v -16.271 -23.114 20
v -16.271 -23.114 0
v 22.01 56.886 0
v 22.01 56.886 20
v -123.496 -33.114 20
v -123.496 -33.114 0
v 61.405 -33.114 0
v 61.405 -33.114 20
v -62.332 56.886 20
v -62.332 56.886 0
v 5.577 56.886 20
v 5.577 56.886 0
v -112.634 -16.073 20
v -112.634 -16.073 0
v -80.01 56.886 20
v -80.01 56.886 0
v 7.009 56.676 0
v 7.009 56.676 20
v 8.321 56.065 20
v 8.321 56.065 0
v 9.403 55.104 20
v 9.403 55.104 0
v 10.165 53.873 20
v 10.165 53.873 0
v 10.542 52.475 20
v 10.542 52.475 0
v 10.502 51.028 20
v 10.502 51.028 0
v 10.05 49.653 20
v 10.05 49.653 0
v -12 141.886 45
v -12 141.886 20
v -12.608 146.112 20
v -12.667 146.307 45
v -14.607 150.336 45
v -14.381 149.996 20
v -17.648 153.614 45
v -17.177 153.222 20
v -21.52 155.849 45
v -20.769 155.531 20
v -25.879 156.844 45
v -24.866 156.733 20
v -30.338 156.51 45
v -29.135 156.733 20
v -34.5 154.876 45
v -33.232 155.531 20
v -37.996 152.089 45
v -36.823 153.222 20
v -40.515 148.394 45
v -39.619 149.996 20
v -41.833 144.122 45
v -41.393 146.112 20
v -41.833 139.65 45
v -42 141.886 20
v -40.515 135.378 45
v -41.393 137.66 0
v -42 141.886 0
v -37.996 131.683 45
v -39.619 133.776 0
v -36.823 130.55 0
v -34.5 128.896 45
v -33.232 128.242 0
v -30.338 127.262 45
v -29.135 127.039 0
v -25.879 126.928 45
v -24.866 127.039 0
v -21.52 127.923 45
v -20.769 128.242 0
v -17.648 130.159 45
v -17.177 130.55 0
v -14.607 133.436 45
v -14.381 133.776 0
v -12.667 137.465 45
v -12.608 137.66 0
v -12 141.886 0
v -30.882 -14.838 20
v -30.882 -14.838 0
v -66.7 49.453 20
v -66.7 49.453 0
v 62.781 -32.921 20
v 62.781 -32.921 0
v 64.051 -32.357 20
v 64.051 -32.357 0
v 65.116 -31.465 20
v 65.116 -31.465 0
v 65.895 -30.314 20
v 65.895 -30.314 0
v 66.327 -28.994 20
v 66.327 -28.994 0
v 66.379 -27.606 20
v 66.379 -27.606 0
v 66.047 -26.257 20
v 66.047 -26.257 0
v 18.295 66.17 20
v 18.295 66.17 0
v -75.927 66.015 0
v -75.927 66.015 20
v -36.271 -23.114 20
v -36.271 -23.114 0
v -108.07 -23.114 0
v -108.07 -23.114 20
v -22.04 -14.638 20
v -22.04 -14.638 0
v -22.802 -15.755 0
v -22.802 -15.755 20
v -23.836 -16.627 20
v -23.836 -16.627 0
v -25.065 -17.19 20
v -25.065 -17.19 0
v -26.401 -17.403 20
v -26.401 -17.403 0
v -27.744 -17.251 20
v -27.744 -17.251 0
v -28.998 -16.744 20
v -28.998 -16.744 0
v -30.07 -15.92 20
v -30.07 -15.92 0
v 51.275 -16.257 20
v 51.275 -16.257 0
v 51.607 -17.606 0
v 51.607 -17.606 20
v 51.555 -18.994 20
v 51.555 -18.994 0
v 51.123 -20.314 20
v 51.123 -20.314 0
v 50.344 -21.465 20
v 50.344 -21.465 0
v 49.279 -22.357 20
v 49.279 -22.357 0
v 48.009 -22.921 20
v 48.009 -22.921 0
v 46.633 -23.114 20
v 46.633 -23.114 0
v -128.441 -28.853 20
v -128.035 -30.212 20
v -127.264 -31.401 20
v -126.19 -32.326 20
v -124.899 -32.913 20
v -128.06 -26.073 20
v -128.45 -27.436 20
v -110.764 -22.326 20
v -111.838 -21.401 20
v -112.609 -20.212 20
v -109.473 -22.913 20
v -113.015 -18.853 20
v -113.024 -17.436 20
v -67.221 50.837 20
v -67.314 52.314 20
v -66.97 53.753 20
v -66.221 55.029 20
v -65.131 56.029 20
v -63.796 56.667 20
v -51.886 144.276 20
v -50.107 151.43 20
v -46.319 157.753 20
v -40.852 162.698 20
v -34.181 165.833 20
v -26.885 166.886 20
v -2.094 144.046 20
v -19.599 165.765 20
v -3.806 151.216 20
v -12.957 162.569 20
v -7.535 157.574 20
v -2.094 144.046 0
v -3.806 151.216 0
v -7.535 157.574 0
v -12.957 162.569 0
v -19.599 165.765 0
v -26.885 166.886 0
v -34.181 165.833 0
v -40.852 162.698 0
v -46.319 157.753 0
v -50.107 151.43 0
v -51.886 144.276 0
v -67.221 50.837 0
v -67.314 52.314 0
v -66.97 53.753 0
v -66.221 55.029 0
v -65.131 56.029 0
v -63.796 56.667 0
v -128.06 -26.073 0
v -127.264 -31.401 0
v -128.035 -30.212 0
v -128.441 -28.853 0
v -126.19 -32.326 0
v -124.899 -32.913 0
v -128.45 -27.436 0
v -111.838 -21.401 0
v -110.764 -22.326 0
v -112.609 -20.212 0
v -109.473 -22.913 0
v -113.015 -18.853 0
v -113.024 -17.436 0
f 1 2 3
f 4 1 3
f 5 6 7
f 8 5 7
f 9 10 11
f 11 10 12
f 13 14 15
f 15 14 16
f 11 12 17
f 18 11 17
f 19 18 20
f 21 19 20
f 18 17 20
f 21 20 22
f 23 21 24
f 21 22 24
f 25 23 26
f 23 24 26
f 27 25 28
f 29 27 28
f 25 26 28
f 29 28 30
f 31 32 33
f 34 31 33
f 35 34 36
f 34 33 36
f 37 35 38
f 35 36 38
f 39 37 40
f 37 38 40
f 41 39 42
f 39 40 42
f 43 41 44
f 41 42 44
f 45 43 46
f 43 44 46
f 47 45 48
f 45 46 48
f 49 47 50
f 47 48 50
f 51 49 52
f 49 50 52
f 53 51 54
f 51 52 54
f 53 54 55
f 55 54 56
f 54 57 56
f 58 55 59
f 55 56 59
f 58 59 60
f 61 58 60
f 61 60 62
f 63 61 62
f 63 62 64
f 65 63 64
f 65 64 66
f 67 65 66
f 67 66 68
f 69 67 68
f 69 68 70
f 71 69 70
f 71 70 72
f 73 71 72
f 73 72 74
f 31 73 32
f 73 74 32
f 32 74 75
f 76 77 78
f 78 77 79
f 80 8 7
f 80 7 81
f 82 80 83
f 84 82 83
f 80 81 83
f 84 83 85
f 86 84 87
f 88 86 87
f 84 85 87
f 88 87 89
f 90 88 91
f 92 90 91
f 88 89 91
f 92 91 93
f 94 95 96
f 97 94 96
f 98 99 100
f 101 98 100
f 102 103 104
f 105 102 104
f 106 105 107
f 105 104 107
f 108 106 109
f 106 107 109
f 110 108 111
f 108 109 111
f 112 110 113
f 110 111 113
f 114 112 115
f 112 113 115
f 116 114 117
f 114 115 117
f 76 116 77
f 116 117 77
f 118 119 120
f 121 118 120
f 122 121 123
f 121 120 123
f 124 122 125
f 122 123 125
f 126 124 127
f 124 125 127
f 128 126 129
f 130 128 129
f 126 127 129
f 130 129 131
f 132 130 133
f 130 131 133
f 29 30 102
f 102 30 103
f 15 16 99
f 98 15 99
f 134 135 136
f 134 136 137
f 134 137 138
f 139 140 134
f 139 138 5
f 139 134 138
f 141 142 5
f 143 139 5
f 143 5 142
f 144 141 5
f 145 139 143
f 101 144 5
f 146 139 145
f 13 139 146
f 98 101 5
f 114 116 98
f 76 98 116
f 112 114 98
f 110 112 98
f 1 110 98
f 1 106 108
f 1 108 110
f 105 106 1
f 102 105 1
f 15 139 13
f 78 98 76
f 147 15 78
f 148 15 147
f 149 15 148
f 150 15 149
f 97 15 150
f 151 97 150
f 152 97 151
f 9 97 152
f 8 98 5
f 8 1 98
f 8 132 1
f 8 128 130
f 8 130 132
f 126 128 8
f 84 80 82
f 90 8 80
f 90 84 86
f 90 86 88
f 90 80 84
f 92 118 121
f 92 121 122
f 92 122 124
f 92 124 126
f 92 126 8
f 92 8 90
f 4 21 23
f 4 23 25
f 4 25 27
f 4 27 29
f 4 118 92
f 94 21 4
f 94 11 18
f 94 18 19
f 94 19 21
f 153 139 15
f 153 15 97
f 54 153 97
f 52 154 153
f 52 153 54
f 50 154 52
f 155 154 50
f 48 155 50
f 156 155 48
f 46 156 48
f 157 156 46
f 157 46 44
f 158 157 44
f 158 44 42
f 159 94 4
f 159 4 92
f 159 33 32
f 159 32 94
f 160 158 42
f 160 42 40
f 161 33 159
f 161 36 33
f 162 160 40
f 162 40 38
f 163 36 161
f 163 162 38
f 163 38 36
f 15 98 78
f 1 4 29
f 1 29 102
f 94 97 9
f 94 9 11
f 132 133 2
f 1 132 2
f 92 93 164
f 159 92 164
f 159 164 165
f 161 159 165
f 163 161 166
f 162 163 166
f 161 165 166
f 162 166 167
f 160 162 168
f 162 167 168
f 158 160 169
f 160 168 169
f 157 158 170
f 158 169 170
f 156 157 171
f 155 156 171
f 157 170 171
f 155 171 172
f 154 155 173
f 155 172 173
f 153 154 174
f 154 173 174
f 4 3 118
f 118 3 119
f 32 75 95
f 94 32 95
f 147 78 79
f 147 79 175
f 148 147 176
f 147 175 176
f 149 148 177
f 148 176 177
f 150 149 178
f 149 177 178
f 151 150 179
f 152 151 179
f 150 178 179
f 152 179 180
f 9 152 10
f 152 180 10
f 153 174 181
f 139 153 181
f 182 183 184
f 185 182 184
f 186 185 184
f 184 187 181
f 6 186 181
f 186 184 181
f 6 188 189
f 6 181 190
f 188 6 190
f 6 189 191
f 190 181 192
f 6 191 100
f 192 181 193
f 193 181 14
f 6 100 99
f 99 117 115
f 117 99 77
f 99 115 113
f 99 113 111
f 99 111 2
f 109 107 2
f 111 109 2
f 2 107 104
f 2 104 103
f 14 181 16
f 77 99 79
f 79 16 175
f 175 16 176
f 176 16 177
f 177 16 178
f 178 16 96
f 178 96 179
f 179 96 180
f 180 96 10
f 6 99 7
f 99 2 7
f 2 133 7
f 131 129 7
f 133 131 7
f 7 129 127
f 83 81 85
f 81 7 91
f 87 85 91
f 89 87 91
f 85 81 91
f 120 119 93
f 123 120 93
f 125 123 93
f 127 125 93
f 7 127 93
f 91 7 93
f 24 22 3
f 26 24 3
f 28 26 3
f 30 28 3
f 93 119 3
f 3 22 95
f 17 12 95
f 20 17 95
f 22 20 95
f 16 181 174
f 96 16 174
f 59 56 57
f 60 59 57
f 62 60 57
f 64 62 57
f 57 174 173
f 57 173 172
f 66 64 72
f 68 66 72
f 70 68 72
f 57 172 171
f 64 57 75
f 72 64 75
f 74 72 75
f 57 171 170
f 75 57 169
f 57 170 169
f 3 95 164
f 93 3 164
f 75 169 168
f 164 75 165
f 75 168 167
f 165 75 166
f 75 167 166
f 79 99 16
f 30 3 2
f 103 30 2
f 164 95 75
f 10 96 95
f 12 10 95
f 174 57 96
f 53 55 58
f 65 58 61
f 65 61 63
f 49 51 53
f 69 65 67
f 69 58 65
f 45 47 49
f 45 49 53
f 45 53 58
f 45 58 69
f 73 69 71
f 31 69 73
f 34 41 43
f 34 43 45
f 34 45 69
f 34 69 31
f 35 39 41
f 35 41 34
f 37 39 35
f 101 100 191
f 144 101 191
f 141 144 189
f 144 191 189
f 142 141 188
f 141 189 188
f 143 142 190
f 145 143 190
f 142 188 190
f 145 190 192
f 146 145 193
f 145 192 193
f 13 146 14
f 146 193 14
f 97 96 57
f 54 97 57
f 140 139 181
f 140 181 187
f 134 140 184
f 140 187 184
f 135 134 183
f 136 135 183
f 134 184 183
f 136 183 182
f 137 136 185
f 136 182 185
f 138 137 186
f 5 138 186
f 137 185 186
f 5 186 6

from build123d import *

# Parameters (mm, degrees)
F1_DEPTH = 20
F2_R     = 15
F3_DEPTH = 25


with BuildPart() as f1:
    # F0 (on Top) → F1 (new body)
    with BuildSketch(Plane.XY):
        with BuildLine():
            Line((66.0472436046, -26.2565443359), (-2.0937833608, 144.0460289628))
            ThreePointArc((-2.0937833608, 144.0460289628), (-26.8847617752, 166.8857654042), (-51.8857822677, 144.2761403347))
            Line((-51.8857822677, 144.2761403347), (-128.0604405721, -26.0728991835))
            ThreePointArc((-128.0604405721, -26.0728991835), (-127.6915622894, -30.833770725), (-123.4960085584, -33.1139676273))
            Line((-123.4960085584, -33.1139676273), (61.4050481416, -33.1139676273))
            ThreePointArc((61.4050481416, -33.1139676273), (65.5455261609, -30.9169021202), (66.0472436046, -26.2565443359))
        make_face()
        with BuildLine():
            Line((-36.2713433227, -23.1139676273), (-108.0700619725, -23.1139676273))
            ThreePointArc((-108.0700619725, -23.1139676273), (-112.2656157035, -20.833770725), (-112.6344939862, -16.0728991835))
            Line((-112.6344939862, -16.0728991835), (-80.009586342, 56.8860323727))
            Line((-80.009586342, 56.8860323727), (-75.9274494544, 66.0148964001))
            Line((-75.9274494544, 66.0148964001), (-42.0002968609, 141.8860323727))
            ThreePointArc((-42.0002968609, 141.8860323727), (-37.6068985787, 152.4926340905), (-27.0002968609, 156.8860323727))
            ThreePointArc((-27.0002968609, 156.8860323727), (-16.3936951431, 152.4926340905), (-12.0002968609, 141.8860323727))
            Line((-12.0002968609, 141.8860323727), (18.2948376146, 66.1704232987))
            Line((18.2948376146, 66.1704232987), (22.0096841973, 56.8860323727))
            Line((22.0096841973, 56.8860323727), (51.2753035904, -16.2565443359))
            ThreePointArc((51.2753035904, -16.2565443359), (50.7735861467, -20.9169021202), (46.6331081274, -23.1139676273))
            Line((46.6331081274, -23.1139676273), (-16.2713433227, -23.1139676273))
            Line((-16.2713433227, -23.1139676273), (-36.2713433227, -23.1139676273))
        make_face(mode=Mode.SUBTRACT)
        Polygon((-80.009586342, 56.8860323727), (-36.2713433227, -23.1139676273), (-16.2713433227, -23.1139676273), (22.0096841973, 56.8860323727), (18.2948376146, 66.1704232987), (-75.9274494544, 66.0148964001), align=None)
        with BuildLine():
            Line((-62.3322616112, 56.8860323727), (5.5765360215, 56.8860323727))
            ThreePointArc((5.5765360215, 56.8860323727), (9.8288943227, 54.5161367201), (10.0501944434, 49.6530119241))
            Line((10.0501944434, 49.6530119241), (-22.0404632685, -14.6377746762))
            ThreePointArc((-22.0404632685, -14.6377746762), (-26.4008005729, -17.403469895), (-30.8819908215, -14.8382125186))
            Line((-30.8819908215, -14.8382125186), (-66.7001307422, 49.4525740817))
            ThreePointArc((-66.7001307422, 49.4525740817), (-66.6431368968, 54.4190847355), (-62.3322616112, 56.8860323727))
        make_face(mode=Mode.SUBTRACT)
        with BuildLine():
            ThreePointArc((-27.0002968609, 156.8860323727), (-37.6068985787, 152.4926340905), (-42.0002968609, 141.8860323727))
            ThreePointArc((-42.0002968609, 141.8860323727), (-27.0002968609, 126.8860323727), (-12.0002968609, 141.8860323727))
            ThreePointArc((-12.0002968609, 141.8860323727), (-16.3936951431, 152.4926340905), (-27.0002968609, 156.8860323727))
        make_face()
    extrude(amount=F1_DEPTH)

    # F2 (on face) → F3 (join)
    with BuildSketch(Plane.XY.offset(20)):
        with Locations((-27.0002968609, 141.8860323727)):
            Circle(F2_R)
    extrude(amount=F3_DEPTH)


solid = f1.part
